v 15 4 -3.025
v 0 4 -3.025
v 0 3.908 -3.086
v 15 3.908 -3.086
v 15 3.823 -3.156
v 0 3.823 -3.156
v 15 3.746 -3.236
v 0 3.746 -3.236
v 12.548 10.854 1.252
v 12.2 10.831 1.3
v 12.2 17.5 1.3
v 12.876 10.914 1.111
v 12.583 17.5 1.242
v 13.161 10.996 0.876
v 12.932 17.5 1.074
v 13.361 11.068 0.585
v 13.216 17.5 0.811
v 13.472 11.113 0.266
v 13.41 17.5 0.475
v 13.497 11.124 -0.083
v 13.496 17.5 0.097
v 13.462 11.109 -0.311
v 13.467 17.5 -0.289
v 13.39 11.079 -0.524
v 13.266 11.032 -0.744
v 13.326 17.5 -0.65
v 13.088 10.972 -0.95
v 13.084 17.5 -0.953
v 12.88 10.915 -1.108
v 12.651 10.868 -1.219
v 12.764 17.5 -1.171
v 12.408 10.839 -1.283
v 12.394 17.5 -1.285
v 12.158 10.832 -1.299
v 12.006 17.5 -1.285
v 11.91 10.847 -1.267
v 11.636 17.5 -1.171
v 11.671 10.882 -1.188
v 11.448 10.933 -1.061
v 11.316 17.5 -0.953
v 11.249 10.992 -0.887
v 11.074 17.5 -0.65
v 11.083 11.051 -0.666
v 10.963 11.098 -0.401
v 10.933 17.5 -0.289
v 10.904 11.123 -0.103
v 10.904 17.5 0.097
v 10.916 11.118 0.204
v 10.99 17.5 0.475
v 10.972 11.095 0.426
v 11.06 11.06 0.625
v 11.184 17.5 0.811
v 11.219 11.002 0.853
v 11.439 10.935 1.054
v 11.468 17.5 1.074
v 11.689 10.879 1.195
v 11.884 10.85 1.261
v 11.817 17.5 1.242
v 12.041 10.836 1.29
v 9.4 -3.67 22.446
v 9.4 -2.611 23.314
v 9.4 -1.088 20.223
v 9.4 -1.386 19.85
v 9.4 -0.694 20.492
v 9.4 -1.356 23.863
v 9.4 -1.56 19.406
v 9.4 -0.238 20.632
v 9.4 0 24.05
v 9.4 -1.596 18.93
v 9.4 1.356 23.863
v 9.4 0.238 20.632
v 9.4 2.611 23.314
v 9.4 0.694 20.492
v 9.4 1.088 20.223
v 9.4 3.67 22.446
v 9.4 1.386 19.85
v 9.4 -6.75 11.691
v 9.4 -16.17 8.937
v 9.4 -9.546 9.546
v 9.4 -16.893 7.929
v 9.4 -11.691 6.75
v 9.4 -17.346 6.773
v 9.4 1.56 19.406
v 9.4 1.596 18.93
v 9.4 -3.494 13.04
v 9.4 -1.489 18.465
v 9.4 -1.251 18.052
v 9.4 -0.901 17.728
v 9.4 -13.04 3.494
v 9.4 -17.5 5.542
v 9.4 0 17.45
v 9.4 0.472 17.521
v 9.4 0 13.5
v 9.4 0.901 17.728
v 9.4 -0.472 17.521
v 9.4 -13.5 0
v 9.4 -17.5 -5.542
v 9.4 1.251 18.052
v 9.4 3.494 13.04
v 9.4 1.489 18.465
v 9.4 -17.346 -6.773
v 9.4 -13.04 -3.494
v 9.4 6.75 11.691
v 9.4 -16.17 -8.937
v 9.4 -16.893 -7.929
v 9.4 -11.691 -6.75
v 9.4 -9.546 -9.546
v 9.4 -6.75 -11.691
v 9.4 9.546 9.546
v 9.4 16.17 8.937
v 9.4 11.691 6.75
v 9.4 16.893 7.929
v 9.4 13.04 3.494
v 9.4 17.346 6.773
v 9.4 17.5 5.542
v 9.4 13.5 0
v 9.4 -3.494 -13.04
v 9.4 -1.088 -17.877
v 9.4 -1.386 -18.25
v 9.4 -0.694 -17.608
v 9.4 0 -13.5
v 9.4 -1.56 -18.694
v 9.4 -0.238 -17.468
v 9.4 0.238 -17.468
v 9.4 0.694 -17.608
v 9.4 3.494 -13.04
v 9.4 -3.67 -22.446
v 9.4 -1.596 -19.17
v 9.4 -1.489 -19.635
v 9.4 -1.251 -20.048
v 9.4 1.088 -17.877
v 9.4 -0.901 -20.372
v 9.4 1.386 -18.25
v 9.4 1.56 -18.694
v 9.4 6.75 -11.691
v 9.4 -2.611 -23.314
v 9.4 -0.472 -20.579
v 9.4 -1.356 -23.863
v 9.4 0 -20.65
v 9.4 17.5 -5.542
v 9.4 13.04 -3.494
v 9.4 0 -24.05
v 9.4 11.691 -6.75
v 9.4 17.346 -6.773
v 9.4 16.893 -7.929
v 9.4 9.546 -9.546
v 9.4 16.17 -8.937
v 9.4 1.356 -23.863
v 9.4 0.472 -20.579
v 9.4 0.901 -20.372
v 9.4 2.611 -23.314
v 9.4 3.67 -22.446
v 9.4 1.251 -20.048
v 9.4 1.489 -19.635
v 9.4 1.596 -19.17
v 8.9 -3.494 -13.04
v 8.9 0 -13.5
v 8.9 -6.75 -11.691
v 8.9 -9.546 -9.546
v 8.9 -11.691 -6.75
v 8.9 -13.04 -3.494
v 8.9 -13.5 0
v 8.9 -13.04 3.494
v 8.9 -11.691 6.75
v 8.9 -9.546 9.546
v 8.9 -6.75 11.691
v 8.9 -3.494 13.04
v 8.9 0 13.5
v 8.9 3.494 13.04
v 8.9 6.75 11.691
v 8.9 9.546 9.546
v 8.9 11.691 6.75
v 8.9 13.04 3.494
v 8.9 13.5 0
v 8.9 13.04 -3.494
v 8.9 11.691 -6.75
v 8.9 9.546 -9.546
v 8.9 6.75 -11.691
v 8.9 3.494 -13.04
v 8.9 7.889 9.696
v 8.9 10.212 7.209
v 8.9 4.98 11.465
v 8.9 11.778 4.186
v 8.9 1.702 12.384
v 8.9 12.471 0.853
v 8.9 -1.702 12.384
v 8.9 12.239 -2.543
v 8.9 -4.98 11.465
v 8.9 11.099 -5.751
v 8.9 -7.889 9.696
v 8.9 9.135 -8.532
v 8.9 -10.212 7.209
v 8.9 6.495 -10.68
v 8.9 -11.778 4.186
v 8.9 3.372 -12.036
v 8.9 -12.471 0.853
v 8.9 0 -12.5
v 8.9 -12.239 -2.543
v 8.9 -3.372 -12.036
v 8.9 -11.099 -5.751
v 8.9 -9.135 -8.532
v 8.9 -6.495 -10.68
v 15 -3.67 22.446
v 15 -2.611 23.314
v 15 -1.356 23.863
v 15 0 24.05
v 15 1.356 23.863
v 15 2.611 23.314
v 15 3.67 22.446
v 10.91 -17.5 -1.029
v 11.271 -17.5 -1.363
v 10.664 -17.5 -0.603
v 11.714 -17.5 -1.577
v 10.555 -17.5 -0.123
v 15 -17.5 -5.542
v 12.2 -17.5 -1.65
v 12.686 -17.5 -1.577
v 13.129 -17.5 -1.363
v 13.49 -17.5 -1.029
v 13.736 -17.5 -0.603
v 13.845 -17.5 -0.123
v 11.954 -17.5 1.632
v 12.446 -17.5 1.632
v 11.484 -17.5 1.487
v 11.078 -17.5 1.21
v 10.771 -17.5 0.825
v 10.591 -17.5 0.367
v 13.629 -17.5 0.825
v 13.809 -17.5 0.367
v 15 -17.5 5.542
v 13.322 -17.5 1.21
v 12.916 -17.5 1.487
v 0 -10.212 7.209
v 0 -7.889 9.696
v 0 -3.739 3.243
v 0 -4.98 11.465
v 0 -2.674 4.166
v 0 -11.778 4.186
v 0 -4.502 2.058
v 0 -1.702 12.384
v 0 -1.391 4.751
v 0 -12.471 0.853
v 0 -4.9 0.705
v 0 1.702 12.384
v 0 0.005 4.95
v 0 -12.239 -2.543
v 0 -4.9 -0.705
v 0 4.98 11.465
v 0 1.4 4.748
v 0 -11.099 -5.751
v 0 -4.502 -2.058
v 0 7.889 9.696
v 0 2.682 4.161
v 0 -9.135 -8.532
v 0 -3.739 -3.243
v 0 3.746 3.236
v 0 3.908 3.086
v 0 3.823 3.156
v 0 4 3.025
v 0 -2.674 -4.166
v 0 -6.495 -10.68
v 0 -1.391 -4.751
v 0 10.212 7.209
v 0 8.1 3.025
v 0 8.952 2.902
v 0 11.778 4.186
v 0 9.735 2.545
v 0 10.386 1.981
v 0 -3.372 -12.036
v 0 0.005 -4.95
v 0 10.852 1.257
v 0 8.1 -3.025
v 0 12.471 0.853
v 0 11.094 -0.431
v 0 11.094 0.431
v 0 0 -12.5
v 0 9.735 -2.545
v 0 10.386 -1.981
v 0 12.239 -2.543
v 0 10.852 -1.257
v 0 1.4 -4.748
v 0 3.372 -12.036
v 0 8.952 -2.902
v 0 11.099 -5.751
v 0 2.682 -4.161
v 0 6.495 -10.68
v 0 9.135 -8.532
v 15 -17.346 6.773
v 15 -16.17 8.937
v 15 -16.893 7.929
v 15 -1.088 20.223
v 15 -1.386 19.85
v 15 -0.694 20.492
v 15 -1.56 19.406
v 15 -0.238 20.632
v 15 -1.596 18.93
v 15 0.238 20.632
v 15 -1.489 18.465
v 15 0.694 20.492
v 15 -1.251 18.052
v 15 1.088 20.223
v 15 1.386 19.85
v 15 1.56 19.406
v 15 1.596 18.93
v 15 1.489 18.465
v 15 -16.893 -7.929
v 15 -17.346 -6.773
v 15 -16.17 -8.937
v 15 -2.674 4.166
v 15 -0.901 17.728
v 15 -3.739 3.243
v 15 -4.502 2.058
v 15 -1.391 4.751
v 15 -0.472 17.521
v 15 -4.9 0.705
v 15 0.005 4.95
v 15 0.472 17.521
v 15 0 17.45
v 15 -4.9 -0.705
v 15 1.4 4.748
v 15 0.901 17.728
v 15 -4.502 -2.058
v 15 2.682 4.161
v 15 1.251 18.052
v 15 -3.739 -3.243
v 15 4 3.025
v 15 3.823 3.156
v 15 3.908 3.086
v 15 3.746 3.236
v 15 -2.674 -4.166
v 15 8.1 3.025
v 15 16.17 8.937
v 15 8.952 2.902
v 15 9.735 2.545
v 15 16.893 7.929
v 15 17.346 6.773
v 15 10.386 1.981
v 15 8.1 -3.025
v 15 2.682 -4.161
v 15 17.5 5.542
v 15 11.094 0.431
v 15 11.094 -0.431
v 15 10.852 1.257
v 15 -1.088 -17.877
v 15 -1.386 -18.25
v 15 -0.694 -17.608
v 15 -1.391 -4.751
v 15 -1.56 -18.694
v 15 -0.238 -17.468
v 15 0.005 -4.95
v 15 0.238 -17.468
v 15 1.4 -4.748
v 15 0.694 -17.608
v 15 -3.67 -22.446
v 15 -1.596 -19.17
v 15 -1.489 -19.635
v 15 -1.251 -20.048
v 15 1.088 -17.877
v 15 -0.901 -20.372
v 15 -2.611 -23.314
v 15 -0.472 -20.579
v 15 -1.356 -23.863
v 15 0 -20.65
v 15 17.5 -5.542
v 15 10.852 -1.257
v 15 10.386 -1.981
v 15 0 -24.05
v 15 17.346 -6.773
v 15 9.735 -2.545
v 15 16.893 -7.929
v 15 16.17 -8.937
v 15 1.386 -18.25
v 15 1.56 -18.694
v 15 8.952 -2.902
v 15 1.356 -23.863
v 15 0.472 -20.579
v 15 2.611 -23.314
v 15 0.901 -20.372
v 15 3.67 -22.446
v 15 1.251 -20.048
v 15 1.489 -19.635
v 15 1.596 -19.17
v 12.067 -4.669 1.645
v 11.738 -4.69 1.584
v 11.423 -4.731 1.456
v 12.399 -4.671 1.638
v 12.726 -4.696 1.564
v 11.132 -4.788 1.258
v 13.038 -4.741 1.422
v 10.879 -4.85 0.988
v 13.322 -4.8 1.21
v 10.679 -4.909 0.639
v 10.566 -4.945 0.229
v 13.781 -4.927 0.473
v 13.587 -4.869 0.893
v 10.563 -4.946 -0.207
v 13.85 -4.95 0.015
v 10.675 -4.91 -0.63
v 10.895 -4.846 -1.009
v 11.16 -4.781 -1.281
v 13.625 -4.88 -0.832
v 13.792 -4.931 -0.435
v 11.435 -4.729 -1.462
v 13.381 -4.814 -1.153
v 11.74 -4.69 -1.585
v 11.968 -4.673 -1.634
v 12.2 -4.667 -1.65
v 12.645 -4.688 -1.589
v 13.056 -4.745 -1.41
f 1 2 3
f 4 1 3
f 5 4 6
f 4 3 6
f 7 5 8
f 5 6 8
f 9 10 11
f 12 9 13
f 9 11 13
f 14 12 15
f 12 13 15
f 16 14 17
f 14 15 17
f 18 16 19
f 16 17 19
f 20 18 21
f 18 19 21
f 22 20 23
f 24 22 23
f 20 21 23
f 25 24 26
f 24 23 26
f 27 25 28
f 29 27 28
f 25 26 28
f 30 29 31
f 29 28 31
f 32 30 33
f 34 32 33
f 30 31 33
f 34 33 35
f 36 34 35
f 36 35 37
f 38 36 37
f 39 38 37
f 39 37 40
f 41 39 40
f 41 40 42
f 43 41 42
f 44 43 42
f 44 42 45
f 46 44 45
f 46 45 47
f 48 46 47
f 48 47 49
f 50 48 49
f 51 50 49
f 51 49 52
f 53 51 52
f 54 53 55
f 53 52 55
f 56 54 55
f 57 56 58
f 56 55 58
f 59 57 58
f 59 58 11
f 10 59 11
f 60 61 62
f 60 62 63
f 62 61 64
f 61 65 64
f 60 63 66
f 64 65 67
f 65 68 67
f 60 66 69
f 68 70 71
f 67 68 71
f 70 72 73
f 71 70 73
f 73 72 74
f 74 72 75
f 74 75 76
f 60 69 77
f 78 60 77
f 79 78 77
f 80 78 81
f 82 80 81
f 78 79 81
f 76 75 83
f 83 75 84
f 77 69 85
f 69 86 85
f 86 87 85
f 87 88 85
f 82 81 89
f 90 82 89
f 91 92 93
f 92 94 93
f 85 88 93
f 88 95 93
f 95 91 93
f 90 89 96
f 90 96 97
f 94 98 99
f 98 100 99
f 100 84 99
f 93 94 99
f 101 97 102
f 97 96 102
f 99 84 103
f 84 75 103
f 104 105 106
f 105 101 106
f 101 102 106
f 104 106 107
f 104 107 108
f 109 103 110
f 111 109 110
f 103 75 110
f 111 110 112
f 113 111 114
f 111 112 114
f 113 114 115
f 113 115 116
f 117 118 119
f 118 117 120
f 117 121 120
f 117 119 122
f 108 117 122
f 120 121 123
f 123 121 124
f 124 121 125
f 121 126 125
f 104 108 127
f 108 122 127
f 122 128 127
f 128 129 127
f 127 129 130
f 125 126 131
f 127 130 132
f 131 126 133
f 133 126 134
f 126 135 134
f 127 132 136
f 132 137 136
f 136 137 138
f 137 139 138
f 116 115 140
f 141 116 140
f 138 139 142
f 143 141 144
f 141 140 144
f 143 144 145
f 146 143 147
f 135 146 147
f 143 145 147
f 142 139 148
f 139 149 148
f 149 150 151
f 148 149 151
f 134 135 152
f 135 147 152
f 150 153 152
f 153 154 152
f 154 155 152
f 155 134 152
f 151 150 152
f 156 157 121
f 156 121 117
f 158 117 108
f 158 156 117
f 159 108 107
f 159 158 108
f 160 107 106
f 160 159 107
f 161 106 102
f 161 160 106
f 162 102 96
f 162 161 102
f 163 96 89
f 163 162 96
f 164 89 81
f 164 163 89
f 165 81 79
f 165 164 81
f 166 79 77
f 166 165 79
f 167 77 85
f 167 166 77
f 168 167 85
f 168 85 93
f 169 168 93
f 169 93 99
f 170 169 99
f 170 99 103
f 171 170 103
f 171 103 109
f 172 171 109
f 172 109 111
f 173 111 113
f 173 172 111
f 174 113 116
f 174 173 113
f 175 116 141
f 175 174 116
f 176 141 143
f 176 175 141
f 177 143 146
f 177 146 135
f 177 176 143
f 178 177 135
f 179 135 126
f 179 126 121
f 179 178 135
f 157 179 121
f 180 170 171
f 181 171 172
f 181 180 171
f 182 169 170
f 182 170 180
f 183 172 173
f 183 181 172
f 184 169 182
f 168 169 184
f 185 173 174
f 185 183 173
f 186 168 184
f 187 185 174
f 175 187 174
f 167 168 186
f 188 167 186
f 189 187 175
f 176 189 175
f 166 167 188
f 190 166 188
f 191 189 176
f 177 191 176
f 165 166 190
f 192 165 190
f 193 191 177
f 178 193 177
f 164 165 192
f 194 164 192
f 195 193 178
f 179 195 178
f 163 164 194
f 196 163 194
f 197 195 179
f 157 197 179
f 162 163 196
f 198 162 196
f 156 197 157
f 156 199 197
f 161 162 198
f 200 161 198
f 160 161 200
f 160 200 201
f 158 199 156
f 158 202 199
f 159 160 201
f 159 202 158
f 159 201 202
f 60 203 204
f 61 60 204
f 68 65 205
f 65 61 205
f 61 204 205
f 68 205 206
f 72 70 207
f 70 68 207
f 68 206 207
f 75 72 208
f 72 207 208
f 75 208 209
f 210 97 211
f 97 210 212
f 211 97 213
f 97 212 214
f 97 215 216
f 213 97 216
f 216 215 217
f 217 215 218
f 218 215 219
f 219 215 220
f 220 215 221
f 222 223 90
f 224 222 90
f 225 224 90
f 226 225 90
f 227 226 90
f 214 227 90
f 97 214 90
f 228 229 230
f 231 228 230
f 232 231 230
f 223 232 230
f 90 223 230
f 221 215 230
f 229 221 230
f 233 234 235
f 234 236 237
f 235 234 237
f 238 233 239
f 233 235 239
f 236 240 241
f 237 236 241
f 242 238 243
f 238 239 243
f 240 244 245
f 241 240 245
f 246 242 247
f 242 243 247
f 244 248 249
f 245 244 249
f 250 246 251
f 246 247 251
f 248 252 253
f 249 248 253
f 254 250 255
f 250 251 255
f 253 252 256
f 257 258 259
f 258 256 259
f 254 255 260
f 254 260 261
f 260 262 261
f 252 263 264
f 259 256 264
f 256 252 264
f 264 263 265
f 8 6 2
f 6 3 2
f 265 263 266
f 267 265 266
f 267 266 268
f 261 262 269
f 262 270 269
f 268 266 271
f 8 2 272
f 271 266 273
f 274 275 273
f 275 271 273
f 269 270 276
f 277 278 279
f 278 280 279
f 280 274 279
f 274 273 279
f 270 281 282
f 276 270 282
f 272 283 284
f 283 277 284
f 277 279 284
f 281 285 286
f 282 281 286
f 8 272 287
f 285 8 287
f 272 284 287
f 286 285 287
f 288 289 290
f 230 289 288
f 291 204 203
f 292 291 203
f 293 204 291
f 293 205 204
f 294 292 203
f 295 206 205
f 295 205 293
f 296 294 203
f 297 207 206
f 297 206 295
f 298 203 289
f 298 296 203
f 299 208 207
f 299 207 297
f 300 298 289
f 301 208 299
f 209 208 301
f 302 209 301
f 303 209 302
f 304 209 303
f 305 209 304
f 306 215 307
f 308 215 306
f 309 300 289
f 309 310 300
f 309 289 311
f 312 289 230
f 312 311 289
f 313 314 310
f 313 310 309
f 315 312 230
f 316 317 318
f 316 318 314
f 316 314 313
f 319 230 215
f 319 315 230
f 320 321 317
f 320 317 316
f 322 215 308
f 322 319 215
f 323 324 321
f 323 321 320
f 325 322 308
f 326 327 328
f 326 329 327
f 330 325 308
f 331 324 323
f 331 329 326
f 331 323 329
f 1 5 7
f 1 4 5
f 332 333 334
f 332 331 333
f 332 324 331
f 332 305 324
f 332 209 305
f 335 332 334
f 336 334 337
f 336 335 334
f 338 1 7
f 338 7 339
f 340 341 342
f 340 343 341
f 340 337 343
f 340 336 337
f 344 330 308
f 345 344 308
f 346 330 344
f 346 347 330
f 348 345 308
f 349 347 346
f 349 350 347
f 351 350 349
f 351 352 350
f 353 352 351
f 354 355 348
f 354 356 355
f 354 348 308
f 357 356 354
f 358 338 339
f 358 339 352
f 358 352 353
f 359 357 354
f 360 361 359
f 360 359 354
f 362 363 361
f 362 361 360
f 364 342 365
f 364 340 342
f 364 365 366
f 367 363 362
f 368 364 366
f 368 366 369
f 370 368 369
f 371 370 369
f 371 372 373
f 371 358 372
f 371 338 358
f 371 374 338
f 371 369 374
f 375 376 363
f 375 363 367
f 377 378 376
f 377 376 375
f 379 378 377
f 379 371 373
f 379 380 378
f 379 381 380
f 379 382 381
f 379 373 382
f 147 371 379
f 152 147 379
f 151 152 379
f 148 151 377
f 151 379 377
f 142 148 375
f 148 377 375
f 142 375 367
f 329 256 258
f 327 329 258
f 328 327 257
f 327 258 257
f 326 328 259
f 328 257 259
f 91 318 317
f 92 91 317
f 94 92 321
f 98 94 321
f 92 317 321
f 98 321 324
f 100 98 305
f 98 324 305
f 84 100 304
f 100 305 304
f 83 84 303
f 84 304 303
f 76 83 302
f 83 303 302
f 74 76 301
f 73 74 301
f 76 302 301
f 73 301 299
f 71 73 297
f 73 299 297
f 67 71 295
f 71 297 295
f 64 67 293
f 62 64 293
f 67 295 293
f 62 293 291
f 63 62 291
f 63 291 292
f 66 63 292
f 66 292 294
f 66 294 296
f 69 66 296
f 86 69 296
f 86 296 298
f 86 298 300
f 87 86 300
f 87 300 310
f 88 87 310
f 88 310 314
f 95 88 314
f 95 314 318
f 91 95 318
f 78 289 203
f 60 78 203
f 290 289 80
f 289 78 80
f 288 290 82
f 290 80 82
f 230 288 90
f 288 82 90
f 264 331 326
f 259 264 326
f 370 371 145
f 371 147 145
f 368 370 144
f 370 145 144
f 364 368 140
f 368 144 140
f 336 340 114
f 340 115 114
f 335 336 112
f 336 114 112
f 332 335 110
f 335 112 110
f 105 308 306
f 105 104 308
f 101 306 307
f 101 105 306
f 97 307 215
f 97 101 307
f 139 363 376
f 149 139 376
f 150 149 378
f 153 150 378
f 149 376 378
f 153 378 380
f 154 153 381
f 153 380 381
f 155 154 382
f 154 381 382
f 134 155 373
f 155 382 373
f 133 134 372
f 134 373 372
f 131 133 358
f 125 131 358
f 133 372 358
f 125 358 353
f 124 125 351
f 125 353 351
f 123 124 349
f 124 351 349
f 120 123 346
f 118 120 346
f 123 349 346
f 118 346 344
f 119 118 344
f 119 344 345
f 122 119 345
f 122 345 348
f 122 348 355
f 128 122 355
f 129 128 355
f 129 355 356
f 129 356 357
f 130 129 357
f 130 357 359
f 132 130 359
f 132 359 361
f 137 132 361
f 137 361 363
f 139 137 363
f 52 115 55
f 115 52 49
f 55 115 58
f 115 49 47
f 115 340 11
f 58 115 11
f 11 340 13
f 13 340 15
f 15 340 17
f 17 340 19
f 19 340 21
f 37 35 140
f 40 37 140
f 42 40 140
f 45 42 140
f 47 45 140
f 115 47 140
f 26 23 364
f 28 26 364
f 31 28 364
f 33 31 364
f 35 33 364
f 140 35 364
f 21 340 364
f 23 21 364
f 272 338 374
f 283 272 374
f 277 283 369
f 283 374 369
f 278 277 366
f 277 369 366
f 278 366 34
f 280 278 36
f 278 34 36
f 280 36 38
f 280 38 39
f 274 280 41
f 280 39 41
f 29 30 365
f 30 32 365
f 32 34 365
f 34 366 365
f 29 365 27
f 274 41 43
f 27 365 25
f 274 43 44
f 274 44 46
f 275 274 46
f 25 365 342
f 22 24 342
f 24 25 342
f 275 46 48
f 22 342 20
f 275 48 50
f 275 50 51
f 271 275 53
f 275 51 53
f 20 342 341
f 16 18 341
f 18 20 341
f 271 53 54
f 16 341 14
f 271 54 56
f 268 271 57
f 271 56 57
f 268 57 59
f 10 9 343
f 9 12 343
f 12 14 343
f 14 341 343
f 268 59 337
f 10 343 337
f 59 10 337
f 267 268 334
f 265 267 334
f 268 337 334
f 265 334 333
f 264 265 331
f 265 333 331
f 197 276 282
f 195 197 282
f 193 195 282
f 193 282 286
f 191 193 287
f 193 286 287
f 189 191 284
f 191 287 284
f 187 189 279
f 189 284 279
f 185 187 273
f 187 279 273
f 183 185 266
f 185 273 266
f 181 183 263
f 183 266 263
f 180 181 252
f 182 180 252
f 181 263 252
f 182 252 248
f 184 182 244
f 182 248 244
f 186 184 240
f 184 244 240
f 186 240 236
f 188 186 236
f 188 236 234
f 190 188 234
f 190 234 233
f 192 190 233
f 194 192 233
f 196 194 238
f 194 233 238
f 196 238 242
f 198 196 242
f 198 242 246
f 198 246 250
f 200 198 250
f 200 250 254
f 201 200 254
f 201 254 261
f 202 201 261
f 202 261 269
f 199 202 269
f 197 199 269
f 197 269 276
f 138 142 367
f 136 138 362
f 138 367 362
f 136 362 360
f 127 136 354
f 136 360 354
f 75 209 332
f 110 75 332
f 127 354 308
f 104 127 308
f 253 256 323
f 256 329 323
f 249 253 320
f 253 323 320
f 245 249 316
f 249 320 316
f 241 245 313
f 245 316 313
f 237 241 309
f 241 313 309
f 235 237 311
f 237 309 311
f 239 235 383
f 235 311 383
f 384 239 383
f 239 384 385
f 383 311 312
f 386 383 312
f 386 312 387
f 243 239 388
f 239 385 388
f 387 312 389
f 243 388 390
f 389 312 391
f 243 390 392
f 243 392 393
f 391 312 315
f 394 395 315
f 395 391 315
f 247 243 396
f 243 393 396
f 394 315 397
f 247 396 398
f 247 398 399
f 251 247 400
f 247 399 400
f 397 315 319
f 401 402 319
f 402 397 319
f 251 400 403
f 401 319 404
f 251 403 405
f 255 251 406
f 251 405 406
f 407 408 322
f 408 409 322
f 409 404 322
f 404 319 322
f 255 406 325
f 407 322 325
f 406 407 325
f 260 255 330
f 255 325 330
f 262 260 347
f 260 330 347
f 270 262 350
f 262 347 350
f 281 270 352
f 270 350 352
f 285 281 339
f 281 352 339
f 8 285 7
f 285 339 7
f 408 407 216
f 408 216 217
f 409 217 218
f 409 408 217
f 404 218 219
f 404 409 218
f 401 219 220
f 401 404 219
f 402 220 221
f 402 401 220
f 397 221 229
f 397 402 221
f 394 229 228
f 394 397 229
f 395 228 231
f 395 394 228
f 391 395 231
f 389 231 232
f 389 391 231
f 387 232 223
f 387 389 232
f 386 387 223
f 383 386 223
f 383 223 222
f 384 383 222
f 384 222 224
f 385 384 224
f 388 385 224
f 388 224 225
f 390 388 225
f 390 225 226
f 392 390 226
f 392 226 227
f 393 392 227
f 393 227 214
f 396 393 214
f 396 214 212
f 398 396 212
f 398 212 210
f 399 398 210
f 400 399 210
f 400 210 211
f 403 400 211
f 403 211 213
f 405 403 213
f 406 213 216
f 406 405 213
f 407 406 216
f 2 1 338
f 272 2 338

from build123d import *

# Parameters (mm, degrees)
SKETCH_1_R          = 12.5
EXTRUDE_1_DEPTH     = 15
SKETCH_2_R          = 25
EXTRUDE_2_DEPTH     = 5.6
SKETCH_3_R          = 4.95
CUT_EXTRUDE_1_DEPTH = 39.405728739
CUT_EXTRUDE_2_DEPTH = 39.405728739
SKETCH_5_R          = 1.3
CUT_EXTRUDE_3_DEPTH = 46.552167896
SKETCH_6_R          = 1.6
CUT_EXTRUDE_4_DEPTH = 35.003676367
EXTRUDE_START       = 0.5
SKETCH_7_R          = 13.5
SKETCH_7_R_2        = 12.5
EXTRUDE_3_DEPTH     = 0.5
CUT_EXTRUDE_6_DEPTH = 35.003676367
CUT_EXTRUDE_7_DEPTH = 15
FILLET_3_R          = 5
FILLET_4_R          = 1
CUT_EXTRUDE_START   = -15
SKETCH_11_R         = 1.65
SKETCH_11_R_2       = 1.3
CUT_EXTRUDE_8_DEPTH = 15


with BuildPart() as part:
    # ｽｹｯﾁ1 → ﾎﾞｽ - 押し出し1 (new body)
    with BuildSketch(Plane(origin=(0, 0, 0), x_dir=(0, 0, -1), z_dir=(1, 0, 0))):
        Circle(SKETCH_1_R)
    extrude(amount=EXTRUDE_1_DEPTH)

    # ｽｹｯﾁ2 → ﾎﾞｽ - 押し出し2 (add)
    with BuildSketch(Plane(origin=(15, 0, 0), x_dir=(0, 0, -1), z_dir=(1, 0, 0))):
        Circle(SKETCH_2_R)
    extrude(amount=-EXTRUDE_2_DEPTH)

    # ｽｹｯﾁ3 → ｶｯﾄ - 押し出し1 (cut, through all)
    with BuildSketch(Plane(origin=(15, 0, 0), x_dir=(0, 0, -1), z_dir=(1, 0, 0))):
        Circle(SKETCH_3_R)
    extrude(amount=-CUT_EXTRUDE_1_DEPTH, mode=Mode.SUBTRACT)

    # ｽｹｯﾁ4 → ｶｯﾄ - 押し出し2 (cut, through all)
    with BuildSketch(Plane(origin=(15, 0, 0), x_dir=(0, 0, -1), z_dir=(1, 0, 0))):
        with BuildLine():
            Line((-17.853571071, 17.5), (17.853571071, 17.5))
            ThreePointArc((17.853571071, 17.5), (0, 25), (-17.853571071, 17.5))
        make_face()
        with BuildLine():
            Line((17.853571071, -17.5), (-17.853571071, -17.5))
            ThreePointArc((-17.853571071, -17.5), (0, -25), (17.853571071, -17.5))
        make_face()
    extrude(amount=-CUT_EXTRUDE_2_DEPTH, mode=Mode.SUBTRACT)

    # ｽｹｯﾁ5 → ｶｯﾄ - 押し出し3 (cut, through all)
    with BuildSketch(Plane(origin=(0, 17.5, 0), x_dir=(1, 0, 0), z_dir=(0, 1, 0))):
        with Locations(Location((12.2, 0, 0), (0, 0, 270))):
            Circle(SKETCH_5_R)
    extrude(amount=-CUT_EXTRUDE_3_DEPTH, mode=Mode.SUBTRACT)

    # ｽｹｯﾁ6 → ｶｯﾄ - 押し出し4 (cut, through all)
    with BuildSketch(Plane(origin=(15, 0, 0), x_dir=(0, 0, -1), z_dir=(1, 0, 0))):
        with Locations((-19.05, 0)):
            Circle(SKETCH_6_R)
        with Locations((19.05, 0)):
            Circle(SKETCH_6_R)
    extrude(amount=-CUT_EXTRUDE_4_DEPTH, mode=Mode.SUBTRACT)

    # ｽｹｯﾁ7 → ﾎﾞｽ - 押し出し3 (add)
    with BuildSketch(Plane.ZY.offset(-9.4).offset(EXTRUDE_START)):
        with Locations(Location((0, 0, 0), (0, 0, 180))):
            Circle(SKETCH_7_R)
        Circle(SKETCH_7_R_2, mode=Mode.SUBTRACT)
    extrude(amount=-EXTRUDE_3_DEPTH)

    # ｽｹｯﾁ9 → ｶｯﾄ - 押し出し6 (cut, through all)
    with BuildSketch(Plane(origin=(15, 0, 0), x_dir=(0, 0, -1), z_dir=(1, 0, 0))):
        with BuildLine():
            Line((-17.853571071, -17.5), (-7.5, -17.5))
            Line((-7.5, -17.5), (-22.445895783, -3.669862645))
            ThreePointArc((-22.445895783, -3.669862645), (-24.05, 0), (-22.445895783, 3.669862645))
            Line((-22.445895783, 3.669862645), (-7.5, 17.5))
            Line((-7.5, 17.5), (-17.853571071, 17.5))
            ThreePointArc((-17.853571071, 17.5), (-25, 0), (-17.853571071, -17.5))
        make_face()
        with BuildLine():
            Line((22.445895783, -3.669862645), (7.5, -17.5))
            Line((7.5, -17.5), (17.853571071, -17.5))
            ThreePointArc((17.853571071, -17.5), (25, 0), (17.853571071, 17.5))
            Line((17.853571071, 17.5), (7.5, 17.5))
            Line((7.5, 17.5), (22.445895783, 3.669862645))
            ThreePointArc((22.445895783, 3.669862645), (23.631456041, 2.002563493), (24.05, 0))
            ThreePointArc((24.05, 0), (23.631456041, -2.002563493), (22.445895783, -3.669862645))
        make_face()
    extrude(amount=-CUT_EXTRUDE_6_DEPTH, mode=Mode.SUBTRACT)

    # ｽｹｯﾁ10 → ｶｯﾄ - 押し出し7 (cut)
    with BuildSketch(Plane(origin=(15, 0, 0), x_dir=(0, 0, -1), z_dir=(1, 0, 0))):
        with BuildLine():
            Line((-3.025, 4), (3.025, 4))
            Line((3.025, 4), (3.025, 8.1))
            ThreePointArc((3.025, 8.1), (0, 11.125), (-3.025, 8.1))
            Line((-3.025, 8.1), (-3.025, 4))
        make_face()
    extrude(amount=-CUT_EXTRUDE_7_DEPTH, mode=Mode.SUBTRACT)

    # ﾌｨﾚｯﾄ3
    fillet_3_edges = [part.edges().sort_by_distance(p)[0] for p in [
        (12.2, 17.5, -7.5),
        (12.2, 17.5, 7.5),
        (12.2, -17.5, -7.5),
        (12.2, -17.5, 7.5),
    ]]
    fillet(fillet_3_edges, radius=FILLET_3_R)

    # ﾌｨﾚｯﾄ4
    # the kernel refuses this fillet: 1 mm, written as the material it takes off along each edge
    with BuildSketch(Plane(origin=(-1.021064618, 4, -2.915904662), x_dir=(0, 0, -1), z_dir=(1, 0, 0))) as fillet_4_piece_1:
        with BuildLine():
            CenterArc((0.973519116, 0.502763893), FILLET_4_R, 210.183026769, 18.996983583)
            ThreePointArc((0.319834447, -0.254003148), (0.162538073, -0.123701466), (0, 0))
            Line((0, 0), (0.109095338, 0))
        make_face()
    extrude(amount=17.042129236, mode=Mode.SUBTRACT)
    with BuildSketch(Plane(origin=(-1.021064618, 4, 2.915904662), x_dir=(0, -0.6219076232643732, 0.783090612972508), z_dir=(1, 0, 0))) as fillet_4_piece_2:
        with BuildLine():
            CenterArc((0.449680983, -0.999148644), FILLET_4_R, 92.364416205, 18.996983583)
            Line((0.085431535, -0.067847222), (0, 0))
            ThreePointArc((0, 0), (0.204212924, -0.00421421), (0.408425847, 0))
        make_face()
    extrude(amount=17.042129236, mode=Mode.SUBTRACT)

    # ｽｹｯﾁ11 → ｶｯﾄ - 押し出し8 (cut)
    with BuildSketch(Plane.XZ.offset(17.5).offset(CUT_EXTRUDE_START)):
        with Locations(Location((12.2, 0, 0), (0, 0, 270))):
            Circle(SKETCH_11_R)
        with Locations(Location((12.2, 0, 0), (0, 0, 90))):
            Circle(SKETCH_11_R_2, mode=Mode.SUBTRACT)
    extrude(amount=CUT_EXTRUDE_8_DEPTH, mode=Mode.SUBTRACT)


solid = part.part
